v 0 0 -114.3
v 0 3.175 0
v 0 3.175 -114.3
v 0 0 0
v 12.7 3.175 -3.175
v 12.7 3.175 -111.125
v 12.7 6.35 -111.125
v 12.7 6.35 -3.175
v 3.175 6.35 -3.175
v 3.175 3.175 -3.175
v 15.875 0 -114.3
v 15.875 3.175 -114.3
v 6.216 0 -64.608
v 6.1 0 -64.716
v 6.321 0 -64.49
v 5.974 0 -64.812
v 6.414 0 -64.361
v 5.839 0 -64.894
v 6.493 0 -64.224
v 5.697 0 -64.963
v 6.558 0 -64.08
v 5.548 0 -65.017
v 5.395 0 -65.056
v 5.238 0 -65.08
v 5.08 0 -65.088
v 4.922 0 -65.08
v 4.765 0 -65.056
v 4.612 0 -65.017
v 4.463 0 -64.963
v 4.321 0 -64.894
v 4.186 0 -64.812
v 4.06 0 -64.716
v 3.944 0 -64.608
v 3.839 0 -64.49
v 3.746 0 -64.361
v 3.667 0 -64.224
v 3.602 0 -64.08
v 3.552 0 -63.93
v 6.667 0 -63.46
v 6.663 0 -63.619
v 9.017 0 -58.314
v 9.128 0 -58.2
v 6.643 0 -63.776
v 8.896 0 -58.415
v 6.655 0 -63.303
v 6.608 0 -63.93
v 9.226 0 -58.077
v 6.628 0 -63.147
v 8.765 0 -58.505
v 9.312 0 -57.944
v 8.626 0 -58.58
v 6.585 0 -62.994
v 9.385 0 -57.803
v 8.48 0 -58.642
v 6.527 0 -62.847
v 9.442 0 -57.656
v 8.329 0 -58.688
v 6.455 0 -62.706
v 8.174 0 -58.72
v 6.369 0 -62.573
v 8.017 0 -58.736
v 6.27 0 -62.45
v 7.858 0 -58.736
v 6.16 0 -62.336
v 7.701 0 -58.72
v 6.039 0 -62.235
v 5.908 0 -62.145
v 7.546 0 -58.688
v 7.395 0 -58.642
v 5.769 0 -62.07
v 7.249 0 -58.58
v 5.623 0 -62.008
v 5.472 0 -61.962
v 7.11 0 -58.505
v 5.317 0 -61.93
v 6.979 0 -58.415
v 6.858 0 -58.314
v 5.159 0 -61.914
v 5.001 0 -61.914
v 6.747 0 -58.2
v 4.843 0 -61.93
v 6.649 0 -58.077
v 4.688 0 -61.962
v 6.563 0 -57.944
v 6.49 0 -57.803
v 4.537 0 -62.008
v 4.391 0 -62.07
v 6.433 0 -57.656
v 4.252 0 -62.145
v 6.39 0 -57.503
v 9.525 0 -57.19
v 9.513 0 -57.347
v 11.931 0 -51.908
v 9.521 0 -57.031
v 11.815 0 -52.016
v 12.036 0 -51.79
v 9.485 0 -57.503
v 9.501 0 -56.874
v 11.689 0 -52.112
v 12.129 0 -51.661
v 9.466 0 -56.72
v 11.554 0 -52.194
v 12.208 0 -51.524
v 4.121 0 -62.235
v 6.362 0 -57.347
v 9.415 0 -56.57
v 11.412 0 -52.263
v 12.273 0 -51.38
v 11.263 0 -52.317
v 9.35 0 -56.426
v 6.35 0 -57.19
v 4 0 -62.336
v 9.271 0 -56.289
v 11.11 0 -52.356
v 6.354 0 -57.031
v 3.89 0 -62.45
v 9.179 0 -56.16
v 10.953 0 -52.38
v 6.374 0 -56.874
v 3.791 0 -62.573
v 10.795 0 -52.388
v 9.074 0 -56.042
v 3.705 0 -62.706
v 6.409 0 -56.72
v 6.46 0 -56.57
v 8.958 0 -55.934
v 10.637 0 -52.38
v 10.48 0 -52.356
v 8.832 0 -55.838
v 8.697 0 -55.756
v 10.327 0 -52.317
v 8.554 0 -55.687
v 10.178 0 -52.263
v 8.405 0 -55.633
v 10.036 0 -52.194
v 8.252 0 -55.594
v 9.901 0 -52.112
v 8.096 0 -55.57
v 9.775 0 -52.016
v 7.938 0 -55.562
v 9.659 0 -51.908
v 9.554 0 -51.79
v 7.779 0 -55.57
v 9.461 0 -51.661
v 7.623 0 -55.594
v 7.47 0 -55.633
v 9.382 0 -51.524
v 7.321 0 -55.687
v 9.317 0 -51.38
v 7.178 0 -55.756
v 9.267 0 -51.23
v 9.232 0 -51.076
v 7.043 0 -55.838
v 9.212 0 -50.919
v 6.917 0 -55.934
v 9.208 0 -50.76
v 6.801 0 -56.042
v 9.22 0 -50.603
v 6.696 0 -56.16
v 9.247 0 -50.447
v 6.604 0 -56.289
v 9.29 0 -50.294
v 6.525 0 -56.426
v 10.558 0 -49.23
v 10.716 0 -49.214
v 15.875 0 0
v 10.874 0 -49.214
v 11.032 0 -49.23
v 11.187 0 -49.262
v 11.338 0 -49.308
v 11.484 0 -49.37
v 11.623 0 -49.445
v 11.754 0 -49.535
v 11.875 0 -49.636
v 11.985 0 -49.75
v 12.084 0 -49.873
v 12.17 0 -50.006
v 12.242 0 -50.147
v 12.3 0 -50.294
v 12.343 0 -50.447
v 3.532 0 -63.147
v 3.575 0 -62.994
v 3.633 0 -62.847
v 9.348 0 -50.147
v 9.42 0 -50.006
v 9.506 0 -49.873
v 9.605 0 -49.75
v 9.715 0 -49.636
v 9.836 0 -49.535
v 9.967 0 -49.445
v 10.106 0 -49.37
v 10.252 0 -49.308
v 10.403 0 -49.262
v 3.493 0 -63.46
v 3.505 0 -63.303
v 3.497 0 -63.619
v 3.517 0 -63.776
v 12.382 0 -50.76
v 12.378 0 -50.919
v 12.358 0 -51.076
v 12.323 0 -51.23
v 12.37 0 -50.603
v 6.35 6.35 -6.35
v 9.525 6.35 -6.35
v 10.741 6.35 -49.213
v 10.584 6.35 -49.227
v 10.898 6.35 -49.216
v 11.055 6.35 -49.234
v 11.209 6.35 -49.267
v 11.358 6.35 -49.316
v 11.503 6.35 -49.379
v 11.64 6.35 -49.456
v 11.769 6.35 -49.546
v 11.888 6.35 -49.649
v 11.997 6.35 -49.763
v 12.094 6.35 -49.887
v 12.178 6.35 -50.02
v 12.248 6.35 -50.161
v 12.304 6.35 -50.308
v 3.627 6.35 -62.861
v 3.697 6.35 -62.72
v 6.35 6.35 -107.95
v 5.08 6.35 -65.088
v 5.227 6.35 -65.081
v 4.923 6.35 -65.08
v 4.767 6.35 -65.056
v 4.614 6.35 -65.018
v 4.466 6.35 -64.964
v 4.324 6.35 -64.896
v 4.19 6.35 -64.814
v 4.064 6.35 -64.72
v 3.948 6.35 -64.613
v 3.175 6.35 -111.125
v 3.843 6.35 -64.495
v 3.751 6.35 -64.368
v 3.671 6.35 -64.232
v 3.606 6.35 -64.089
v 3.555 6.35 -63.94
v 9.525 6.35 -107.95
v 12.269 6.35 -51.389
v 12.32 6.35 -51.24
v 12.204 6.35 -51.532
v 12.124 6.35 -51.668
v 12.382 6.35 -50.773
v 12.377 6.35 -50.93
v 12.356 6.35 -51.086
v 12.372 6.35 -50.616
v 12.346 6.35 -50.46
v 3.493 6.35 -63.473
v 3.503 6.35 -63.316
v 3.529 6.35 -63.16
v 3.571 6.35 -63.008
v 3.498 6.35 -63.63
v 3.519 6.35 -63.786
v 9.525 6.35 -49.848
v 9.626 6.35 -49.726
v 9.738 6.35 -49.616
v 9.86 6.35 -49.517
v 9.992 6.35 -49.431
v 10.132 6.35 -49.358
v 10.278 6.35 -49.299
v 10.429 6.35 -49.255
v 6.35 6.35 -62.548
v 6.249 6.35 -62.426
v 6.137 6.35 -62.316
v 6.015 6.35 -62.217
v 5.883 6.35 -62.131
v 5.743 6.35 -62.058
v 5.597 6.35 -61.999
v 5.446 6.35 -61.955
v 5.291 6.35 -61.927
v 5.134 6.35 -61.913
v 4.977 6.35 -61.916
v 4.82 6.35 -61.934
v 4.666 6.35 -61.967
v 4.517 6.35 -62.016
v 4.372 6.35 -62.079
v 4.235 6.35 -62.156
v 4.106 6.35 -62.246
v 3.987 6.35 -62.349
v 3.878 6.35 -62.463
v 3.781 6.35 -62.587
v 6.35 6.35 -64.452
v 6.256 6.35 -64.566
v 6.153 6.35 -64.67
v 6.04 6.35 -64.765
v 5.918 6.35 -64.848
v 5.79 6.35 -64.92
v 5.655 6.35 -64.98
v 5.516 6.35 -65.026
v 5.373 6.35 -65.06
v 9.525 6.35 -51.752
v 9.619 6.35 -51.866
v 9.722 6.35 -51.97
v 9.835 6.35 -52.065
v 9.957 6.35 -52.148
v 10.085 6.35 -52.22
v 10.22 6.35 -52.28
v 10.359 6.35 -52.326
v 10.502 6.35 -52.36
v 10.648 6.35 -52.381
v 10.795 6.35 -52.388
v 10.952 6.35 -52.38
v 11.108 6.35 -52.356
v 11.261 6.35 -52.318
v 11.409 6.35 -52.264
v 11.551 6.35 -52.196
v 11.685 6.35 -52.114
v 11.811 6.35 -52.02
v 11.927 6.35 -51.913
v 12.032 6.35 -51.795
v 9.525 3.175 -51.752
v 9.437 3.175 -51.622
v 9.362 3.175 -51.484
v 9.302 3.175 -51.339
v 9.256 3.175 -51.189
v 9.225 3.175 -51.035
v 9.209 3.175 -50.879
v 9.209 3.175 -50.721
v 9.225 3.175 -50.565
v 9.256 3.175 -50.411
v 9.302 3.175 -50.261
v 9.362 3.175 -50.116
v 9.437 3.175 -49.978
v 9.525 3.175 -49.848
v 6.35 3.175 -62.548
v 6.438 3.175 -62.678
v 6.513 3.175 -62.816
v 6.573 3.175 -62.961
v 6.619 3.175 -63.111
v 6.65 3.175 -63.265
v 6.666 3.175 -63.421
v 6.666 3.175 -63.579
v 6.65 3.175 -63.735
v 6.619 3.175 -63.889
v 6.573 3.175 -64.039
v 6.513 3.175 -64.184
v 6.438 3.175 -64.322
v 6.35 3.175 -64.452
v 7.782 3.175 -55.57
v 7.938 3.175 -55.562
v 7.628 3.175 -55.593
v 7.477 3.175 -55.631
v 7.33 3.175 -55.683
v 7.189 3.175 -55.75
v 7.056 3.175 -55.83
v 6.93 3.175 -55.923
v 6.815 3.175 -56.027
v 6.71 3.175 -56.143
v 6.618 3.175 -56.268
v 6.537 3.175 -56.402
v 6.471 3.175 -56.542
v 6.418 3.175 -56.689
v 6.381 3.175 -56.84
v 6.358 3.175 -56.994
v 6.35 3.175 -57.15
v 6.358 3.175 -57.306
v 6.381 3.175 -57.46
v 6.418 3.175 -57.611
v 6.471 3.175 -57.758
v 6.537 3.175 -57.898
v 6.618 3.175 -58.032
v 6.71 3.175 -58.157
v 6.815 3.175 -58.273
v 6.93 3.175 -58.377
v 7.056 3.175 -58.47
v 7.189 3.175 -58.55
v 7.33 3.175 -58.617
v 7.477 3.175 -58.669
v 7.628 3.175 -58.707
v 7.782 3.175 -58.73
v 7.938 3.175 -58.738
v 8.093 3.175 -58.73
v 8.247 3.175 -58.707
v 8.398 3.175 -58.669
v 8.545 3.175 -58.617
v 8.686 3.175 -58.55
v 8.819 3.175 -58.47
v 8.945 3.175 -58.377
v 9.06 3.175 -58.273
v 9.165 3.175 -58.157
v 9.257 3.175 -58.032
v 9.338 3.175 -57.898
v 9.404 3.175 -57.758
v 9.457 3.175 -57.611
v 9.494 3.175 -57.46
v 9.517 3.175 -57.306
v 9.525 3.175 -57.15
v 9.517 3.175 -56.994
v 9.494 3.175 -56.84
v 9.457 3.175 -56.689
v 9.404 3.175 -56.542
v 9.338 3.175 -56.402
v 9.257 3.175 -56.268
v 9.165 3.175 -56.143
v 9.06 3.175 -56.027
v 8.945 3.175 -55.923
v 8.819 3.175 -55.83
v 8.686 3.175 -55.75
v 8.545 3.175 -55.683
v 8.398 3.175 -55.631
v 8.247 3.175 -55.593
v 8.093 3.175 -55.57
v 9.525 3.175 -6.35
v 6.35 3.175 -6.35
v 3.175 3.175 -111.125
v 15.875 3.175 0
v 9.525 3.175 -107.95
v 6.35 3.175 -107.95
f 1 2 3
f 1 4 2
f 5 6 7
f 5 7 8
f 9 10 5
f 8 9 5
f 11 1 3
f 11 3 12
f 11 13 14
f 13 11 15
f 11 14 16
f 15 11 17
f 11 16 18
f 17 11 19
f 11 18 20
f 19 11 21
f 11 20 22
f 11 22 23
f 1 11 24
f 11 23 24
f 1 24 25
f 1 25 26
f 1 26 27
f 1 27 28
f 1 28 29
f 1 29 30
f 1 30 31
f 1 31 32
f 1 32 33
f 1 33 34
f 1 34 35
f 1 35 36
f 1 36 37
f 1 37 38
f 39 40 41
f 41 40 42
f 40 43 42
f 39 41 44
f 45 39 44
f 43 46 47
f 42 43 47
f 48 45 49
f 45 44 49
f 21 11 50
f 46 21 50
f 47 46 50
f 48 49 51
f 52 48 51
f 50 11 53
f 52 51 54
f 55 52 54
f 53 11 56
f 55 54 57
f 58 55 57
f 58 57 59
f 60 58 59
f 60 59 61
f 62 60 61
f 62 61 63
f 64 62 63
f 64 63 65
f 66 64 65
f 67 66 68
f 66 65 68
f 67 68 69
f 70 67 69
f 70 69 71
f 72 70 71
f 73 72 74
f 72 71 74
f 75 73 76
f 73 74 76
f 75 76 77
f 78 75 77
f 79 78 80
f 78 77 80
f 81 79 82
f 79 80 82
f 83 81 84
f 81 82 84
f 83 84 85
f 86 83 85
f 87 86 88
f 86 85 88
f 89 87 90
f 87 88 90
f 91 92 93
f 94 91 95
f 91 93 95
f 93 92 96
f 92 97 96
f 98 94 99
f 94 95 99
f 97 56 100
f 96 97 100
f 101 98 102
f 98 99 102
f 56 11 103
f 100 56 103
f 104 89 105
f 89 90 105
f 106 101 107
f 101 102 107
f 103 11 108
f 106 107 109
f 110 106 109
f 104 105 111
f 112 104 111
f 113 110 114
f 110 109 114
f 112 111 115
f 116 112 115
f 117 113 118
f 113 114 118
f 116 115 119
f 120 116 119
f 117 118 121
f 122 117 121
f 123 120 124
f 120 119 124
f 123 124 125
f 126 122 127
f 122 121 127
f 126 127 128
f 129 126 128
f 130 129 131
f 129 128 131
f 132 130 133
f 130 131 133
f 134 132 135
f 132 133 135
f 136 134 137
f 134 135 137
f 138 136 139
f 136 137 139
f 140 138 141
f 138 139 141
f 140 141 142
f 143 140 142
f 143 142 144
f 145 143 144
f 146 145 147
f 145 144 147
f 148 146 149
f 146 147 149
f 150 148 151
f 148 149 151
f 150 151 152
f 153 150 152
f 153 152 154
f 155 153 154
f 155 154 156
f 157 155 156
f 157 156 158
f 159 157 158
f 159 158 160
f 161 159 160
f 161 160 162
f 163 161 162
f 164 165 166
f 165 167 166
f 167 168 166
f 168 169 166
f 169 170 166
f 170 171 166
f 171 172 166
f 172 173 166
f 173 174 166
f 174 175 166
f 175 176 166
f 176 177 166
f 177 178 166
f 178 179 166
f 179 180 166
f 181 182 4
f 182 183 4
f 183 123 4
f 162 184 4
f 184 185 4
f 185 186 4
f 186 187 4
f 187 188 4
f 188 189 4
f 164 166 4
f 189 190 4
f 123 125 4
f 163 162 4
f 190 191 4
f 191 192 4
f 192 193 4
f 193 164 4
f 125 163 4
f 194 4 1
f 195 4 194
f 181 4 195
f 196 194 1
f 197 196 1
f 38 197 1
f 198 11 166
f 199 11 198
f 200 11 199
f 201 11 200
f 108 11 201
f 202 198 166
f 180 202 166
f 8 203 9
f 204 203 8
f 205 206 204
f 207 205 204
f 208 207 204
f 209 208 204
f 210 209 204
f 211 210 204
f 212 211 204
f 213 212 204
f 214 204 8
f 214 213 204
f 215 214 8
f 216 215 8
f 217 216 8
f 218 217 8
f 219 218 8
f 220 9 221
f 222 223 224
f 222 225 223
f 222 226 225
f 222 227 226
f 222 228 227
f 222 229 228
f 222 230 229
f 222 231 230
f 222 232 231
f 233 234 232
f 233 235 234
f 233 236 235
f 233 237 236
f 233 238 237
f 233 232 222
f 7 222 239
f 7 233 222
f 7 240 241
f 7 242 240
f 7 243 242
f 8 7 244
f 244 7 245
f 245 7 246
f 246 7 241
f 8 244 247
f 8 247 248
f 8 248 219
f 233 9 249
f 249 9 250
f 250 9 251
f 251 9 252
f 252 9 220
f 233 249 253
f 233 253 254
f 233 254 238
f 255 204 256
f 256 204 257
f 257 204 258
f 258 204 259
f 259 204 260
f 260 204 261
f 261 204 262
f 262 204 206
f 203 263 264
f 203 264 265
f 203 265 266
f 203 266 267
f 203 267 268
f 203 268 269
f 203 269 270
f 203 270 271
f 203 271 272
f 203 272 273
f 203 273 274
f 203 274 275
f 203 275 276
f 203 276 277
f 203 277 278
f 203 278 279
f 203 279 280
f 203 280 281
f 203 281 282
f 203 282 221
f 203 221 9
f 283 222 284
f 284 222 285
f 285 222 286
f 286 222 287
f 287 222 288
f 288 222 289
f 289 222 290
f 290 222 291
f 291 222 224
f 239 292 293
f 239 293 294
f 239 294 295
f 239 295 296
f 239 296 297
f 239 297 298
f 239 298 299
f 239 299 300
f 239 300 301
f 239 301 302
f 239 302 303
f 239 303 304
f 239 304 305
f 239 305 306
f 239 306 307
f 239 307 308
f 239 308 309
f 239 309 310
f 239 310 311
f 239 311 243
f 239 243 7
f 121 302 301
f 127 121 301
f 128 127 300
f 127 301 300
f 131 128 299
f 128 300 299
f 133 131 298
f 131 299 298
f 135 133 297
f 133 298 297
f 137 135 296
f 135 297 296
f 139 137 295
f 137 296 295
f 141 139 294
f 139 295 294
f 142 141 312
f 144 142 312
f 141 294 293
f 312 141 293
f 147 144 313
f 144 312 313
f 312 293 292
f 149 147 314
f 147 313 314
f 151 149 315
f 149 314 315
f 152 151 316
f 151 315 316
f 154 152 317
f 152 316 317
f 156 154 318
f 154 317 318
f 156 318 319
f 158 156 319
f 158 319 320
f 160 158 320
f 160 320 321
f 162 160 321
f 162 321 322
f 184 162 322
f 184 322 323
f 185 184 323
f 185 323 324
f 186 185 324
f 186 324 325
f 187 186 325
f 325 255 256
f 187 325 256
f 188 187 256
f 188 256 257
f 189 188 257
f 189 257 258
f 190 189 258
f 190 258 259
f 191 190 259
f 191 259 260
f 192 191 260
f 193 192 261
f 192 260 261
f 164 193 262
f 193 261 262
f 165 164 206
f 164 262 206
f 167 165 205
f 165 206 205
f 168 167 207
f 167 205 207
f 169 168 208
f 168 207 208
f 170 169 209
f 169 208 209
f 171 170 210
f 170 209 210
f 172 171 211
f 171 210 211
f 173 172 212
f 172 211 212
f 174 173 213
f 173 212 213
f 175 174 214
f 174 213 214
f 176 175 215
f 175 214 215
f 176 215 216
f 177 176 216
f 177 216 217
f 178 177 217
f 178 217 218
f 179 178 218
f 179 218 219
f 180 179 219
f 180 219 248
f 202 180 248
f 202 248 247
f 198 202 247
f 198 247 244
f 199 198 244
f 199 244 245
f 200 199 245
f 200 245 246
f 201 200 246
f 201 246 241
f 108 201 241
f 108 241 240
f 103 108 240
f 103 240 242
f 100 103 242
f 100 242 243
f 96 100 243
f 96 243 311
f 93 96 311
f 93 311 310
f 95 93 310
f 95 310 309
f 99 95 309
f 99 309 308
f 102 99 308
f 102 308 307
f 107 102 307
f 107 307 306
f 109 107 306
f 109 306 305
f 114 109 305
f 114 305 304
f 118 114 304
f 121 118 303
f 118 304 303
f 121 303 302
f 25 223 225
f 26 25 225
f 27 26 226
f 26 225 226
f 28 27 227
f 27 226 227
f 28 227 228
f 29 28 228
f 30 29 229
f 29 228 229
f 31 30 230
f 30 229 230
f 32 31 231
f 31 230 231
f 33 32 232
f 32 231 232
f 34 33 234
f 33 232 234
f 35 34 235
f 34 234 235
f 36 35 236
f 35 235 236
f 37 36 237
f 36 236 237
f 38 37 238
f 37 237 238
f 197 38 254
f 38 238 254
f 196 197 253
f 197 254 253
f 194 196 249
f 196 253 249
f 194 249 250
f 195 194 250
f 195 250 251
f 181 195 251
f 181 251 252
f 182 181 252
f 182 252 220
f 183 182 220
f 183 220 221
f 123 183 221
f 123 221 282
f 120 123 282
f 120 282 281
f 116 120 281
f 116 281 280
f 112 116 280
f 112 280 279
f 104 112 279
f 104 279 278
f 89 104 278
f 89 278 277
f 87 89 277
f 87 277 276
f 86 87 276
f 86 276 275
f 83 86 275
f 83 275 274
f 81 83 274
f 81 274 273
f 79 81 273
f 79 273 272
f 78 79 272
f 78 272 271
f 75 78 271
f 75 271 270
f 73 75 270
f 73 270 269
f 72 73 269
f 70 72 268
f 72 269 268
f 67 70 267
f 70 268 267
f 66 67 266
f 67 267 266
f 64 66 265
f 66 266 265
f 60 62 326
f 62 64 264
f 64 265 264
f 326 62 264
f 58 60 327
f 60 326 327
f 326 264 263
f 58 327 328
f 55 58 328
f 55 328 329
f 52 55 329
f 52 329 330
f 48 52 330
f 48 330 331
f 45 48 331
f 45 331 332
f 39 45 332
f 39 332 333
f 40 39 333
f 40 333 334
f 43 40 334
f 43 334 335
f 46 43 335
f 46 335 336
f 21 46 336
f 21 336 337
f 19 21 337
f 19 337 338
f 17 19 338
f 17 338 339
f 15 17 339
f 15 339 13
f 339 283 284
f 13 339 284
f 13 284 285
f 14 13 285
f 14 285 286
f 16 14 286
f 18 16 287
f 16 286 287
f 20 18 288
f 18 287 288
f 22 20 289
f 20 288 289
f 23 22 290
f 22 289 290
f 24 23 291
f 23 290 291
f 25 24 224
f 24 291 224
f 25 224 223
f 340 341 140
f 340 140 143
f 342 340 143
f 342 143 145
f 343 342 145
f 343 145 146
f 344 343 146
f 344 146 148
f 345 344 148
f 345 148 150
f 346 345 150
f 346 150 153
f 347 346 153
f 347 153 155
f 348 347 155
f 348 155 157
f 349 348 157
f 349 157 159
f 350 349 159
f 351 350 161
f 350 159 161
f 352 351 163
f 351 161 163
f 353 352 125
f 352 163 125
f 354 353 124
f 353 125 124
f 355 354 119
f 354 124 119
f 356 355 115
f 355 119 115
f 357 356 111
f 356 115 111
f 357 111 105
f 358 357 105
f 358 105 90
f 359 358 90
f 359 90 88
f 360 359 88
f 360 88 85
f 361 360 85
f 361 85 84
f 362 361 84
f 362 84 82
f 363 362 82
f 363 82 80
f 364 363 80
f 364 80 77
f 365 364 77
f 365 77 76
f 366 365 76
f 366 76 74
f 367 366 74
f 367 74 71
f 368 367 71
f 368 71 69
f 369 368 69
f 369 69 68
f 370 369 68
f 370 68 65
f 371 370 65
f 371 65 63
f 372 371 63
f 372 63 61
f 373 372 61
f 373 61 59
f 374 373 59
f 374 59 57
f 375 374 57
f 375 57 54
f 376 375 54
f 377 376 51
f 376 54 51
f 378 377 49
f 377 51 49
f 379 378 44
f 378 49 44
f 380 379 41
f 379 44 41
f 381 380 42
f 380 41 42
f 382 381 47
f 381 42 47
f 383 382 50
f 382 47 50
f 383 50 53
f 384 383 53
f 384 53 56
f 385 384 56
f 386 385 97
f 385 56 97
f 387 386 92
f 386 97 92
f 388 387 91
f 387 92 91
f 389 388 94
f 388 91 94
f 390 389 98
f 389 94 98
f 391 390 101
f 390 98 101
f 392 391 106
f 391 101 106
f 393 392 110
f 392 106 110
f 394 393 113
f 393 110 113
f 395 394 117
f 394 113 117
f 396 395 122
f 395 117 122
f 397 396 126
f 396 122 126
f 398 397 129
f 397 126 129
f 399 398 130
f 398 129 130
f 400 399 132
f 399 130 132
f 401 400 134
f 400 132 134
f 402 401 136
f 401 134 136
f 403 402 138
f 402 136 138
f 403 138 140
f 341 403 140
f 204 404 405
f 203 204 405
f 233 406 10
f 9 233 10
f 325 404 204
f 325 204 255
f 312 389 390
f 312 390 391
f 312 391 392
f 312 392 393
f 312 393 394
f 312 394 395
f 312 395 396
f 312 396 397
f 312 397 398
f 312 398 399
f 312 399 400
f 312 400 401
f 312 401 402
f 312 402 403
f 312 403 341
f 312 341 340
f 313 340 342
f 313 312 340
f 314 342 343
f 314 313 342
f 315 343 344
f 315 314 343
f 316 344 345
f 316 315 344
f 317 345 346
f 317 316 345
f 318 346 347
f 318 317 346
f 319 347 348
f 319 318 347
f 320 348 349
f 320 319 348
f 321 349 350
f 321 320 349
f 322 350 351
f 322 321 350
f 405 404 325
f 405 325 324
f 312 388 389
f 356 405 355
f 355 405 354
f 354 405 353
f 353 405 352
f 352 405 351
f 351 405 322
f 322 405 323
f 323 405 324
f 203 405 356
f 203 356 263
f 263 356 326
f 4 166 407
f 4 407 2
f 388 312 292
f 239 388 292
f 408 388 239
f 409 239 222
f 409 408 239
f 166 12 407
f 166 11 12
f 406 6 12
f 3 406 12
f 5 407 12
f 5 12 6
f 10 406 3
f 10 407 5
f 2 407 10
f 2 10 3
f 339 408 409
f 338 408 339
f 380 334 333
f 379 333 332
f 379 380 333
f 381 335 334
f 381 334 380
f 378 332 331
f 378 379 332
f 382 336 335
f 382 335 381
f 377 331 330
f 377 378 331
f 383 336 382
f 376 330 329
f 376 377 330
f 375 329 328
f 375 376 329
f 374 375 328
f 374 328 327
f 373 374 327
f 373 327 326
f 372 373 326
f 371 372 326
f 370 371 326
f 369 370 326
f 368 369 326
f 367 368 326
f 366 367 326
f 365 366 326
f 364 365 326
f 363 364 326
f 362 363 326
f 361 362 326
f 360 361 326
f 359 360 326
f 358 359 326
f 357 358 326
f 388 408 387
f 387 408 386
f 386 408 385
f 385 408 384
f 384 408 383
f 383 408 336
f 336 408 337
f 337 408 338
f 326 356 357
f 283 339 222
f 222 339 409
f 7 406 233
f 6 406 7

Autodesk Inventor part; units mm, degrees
ref_plane "YZ Plane" through (0, 0, 0) normal (1, 0, 0) x (0, 1, 0)
ref_plane "XZ Plane" through (0, 0, 0) normal (0, 1, 0) x (-1, 0, 0)
ref_plane "XY Plane" through (0, 0, 0) normal (0, 0, 1) x (1, 0, 0)
sketch "Sketch1" plane through (0, 0, 0) normal (0, 1, 0) x (-1, 0, 0)
  line L0 (0, 0) -> (0, -114.3)
  line L1 (0, -114.3) -> (-15.875, -114.3)
  line L2 (-15.875, -114.3) -> (-15.875, 0)
  line L3 (-15.875, 0) -> (0, 0)
  dimension "d0" = 114.3
  dimension "d1" = 15.875
extrude "Extrusion1" add sketch "Sketch1" along normal blind 3.175
sketch "Sketch2" plane through (0, 3.175, 0) normal (0, 1, 0) x (1, 0, 0)
  line L0 (0, 0) -> (3.175, 0)
  line L1 (0, 0) -> (15.875, 0) projected
  line L2 (3.175, 0) -> (3.175, 3.175)
  line L3 (3.175, 3.175) -> (6.35, 3.175)
  line L4 (6.35, 3.175) -> (6.35, 111.125)
  line L5 (6.35, 111.125) -> (3.175, 111.125)
  line L6 (3.175, 111.125) -> (3.175, 3.175)
  line L7 (15.875, 0) -> (15.875, 114.3) projected
  dimension "d4" = 3.175
  dimension "d5" = 3.175
  dimension "d6" = 3.175
  dimension "d7" = 107.95
extrude "Extrusion2" add sketch "Sketch2" along normal blind 3.175
sketch "Sketch3" plane through (0, 3.175, 0) normal (0, 1, 0) x (1, 0, 0)
  line L0 (15.875, 0) -> (15.875, 114.3) projected
  line L1 (15.875, 0) -> (12.7, 0)
  line L2 (0, 0) -> (15.875, 0) projected
  line L3 (12.7, 0) -> (12.7, 3.175)
  line L4 (12.7, 3.175) -> (9.525, 3.175)
  line L5 (9.525, 3.175) -> (9.525, 111.125)
  line L6 (9.525, 111.125) -> (12.7, 111.125)
  line L7 (12.7, 111.125) -> (12.7, 3.175)
  dimension "d10" = 3.175
  dimension "d11" = 3.175
  dimension "d12" = 3.175
  dimension "d13" = 107.95
extrude "Extrusion3" add sketch "Sketch3" along normal blind 3.175
sketch "Sketch4" plane through (0, 3.175, 0) normal (0, 1, 0) x (1, 0, 0)
  line L0 (6.35, 3.175) -> (3.175, 3.175) projected
  line L1 (6.35, 3.175) -> (9.525, 3.175)
  line L2 (9.525, 3.175) -> (9.525, 6.35)
  line L3 (9.525, 6.35) -> (6.35, 6.35)
  line L4 (6.35, 6.35) -> (6.35, 3.175)
  point P0 (0, 0)
  dimension "d16" = 3.175
  dimension "d17" = 3.175
extrude "Extrusion4" add sketch "Sketch4" along normal blind 3.175
sketch "Sketch5" plane through (0, 3.175, 0) normal (0, 1, 0) x (1, 0, 0)
  line L0 (6.35, 6.35) -> (6.35, 111.125) projected
  line L1 (6.35, 111.125) -> (9.525, 111.125)
  line L2 (9.525, 111.125) -> (9.525, 107.95)
  line L3 (9.525, 107.95) -> (6.35, 107.95)
  line L4 (6.35, 107.95) -> (6.35, 111.125)
  point P0 (0, 0)
  dimension "d20" = 3.175
  dimension "d21" = 3.175
extrude "Extrusion5" add sketch "Sketch5" along normal blind 3.175
sketch "Sketch6" plane through (0, 3.175, 0) normal (0, 1, 0) x (1, 0, 0)
  line L0 (0, 0) -> (7.9375, 0)
  line L1 (0, 0) -> (15.875, 0) projected
  line L2 (7.9375, 0) -> (7.9375, 57.15)
  dimension "d24" = 7.9375
  dimension "d25" = 57.15
hole "Hole1" at (7.9375, 3.175, -57.15) direction (0, -1, 0) diameter 3.175 end through all
sketch "Sketch10" plane through (0, 0, 0) normal (0, -1, 0) x (1, 0, 0)
  line L0 (15.875, 0) -> (15.875, -114.3) projected
  line L1 (15.875, 0) -> (15.875, -50.8)
  line L2 (15.875, -50.8) -> (10.795, -50.8)
  point P0 (0, 0)
  dimension "d46" = 50.8
  dimension "d47" = 5.08
hole "Hole3" at (10.795, 0, -50.8) direction (0, 1, 0) diameter 3.175 end through all
sketch "Sketch11" plane through (0, 0, 0) normal (0, -1, 0) x (1, 0, 0)
  line L0 (0, 0) -> (0, -63.5)
  line L1 (0, -114.3) -> (0, 0) projected
  line L2 (0, -63.5) -> (5.08, -63.5)
  dimension "d55" = 63.5
  dimension "d56" = 5.08
hole "Hole4" at (5.08, 0, -63.5) direction (0, 1, 0) diameter 3.175 end through all
properties part number "single_cell_top_case"
